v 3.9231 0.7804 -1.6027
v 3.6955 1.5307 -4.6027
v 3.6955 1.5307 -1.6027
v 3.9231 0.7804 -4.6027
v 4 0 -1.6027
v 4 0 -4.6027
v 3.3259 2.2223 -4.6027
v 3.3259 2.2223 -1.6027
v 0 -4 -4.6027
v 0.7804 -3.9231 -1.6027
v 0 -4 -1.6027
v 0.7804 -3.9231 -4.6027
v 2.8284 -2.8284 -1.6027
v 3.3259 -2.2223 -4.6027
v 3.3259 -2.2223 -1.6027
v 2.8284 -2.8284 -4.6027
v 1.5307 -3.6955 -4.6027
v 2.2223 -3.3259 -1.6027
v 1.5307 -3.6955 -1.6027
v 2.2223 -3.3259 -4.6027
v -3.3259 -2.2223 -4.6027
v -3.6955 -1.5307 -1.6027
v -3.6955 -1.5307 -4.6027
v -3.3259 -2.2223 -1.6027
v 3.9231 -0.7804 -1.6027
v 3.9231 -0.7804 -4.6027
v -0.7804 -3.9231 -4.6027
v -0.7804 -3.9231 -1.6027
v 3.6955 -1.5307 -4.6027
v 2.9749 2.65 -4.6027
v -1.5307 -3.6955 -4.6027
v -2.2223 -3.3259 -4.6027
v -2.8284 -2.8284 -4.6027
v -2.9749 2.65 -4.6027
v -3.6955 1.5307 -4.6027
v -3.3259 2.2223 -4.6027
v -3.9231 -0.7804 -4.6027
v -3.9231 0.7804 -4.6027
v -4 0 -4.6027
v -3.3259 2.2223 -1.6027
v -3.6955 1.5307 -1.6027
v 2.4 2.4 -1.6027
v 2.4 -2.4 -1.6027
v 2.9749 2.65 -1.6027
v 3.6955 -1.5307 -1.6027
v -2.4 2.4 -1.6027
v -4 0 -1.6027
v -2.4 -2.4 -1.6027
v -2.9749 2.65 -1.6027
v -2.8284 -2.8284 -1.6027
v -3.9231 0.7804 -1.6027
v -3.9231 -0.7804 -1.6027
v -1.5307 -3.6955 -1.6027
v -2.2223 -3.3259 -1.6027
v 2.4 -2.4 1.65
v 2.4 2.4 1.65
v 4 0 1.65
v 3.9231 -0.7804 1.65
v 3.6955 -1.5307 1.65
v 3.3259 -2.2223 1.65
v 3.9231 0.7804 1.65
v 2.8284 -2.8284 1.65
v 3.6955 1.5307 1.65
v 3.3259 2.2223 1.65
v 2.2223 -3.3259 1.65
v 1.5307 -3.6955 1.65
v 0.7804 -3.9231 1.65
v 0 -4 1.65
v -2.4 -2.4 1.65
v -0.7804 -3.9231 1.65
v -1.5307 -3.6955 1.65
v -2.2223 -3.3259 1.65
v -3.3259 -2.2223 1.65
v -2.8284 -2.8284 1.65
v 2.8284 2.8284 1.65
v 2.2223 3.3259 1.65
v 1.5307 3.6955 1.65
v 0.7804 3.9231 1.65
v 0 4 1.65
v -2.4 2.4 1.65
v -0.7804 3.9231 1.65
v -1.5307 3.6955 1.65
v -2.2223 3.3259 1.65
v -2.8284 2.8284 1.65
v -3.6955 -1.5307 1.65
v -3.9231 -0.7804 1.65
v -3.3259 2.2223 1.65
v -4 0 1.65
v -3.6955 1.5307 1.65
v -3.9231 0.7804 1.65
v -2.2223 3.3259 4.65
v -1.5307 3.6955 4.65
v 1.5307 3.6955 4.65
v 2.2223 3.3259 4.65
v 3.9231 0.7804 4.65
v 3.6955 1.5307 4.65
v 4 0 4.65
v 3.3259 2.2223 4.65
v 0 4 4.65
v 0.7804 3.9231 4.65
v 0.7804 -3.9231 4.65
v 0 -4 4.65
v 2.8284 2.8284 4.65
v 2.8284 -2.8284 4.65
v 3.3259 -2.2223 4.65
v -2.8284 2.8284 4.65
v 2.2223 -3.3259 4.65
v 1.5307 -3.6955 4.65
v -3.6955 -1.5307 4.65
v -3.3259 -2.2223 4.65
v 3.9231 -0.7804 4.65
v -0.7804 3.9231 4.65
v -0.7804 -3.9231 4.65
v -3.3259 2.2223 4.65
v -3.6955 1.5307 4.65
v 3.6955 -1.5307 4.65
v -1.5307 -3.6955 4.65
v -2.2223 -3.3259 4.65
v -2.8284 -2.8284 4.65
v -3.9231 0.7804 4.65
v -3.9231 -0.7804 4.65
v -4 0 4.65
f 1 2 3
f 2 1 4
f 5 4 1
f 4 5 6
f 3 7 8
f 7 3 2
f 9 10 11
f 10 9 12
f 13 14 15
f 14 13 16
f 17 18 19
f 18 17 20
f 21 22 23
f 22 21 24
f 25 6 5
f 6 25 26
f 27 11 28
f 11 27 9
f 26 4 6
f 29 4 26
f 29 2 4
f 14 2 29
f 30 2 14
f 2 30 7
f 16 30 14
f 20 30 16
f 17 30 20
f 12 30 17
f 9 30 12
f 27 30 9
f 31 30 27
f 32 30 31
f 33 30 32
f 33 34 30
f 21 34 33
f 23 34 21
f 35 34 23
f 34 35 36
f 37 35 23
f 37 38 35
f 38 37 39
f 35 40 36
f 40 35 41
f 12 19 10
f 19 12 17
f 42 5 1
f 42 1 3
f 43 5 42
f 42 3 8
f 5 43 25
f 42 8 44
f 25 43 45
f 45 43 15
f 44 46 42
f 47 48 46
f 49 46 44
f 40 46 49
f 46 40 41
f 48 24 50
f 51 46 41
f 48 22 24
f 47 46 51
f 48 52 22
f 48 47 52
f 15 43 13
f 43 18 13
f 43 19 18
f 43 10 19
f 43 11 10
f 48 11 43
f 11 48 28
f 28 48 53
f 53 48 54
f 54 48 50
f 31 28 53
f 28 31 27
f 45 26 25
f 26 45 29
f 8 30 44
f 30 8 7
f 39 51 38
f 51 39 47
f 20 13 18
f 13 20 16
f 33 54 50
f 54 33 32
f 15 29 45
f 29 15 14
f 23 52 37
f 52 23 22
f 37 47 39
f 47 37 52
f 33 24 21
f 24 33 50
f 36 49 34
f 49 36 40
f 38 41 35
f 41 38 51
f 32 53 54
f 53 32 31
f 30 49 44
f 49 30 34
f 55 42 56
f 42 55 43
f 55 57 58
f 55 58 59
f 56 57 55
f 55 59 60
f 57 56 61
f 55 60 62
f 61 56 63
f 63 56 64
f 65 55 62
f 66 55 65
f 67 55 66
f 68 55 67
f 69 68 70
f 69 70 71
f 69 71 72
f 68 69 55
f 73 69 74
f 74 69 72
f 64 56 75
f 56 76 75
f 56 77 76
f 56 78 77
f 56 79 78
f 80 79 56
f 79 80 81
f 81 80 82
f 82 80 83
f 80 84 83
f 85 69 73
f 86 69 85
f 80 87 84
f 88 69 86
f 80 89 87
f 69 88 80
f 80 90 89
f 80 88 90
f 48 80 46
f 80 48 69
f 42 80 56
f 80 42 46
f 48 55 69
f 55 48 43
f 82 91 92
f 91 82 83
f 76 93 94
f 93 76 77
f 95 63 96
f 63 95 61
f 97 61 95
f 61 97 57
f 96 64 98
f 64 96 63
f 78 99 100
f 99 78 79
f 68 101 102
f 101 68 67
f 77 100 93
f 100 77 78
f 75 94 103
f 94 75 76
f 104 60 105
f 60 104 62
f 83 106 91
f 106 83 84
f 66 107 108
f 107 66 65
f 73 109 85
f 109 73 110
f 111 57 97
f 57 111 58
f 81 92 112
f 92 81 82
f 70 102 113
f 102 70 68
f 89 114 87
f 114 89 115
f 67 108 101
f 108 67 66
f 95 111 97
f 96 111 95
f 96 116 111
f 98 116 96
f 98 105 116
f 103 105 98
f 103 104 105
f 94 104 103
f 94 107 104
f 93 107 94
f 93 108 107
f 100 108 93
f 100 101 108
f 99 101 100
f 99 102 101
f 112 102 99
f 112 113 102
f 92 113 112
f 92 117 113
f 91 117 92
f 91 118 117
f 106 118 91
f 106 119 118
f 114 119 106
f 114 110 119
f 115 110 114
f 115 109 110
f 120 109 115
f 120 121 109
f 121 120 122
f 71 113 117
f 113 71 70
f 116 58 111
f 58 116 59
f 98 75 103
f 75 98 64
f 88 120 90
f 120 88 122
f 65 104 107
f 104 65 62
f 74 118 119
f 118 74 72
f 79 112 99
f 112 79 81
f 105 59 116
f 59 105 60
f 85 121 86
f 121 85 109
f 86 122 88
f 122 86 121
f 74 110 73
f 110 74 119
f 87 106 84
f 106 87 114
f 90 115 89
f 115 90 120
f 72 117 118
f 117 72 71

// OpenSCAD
opening_hole_width = 4.8;
opening_hole_length = 3.3;
flange_radius = 8/2;
flange_thickness = 3.0;
cable_radius = 1.45/2;
cable_length = 50;

module wire() {
    // I'm making this as a replacement, so the wire is different
    // from the original design.
    union() {
        translate([cable_radius, 0, 0]) {
            cylinder(r=cable_radius, h=cable_length, center=true, $fn=32);
        }
        translate([-cable_radius, 0, 0]) {
            cylinder(r=cable_radius, h=cable_length, center=true, $fn=32);
        }
    }
}

module plug() {
    union() {
        cube([opening_hole_width, opening_hole_width, opening_hole_length], center=true);
        translate([0, 0, opening_hole_length/2 + flange_thickness/2]) { 
            cylinder(r=flange_radius, h=flange_thickness, center=true, $fn=32);
        }
        // Slight issue with z-fighting, so move it down a bit less
        translate([0, 0, - 0.985* (opening_hole_length/2 + flange_thickness/2)]) {
            difference() {
                cylinder(r=flange_radius, h=flange_thickness, center=true, $fn=32);
                translate([0, flange_radius + opening_hole_width/2 + 0.25, 0]) {
                    cube([flange_radius*2, flange_radius*2, flange_thickness +1], center=true);
                }
            }
        }
    };
}

plug();
